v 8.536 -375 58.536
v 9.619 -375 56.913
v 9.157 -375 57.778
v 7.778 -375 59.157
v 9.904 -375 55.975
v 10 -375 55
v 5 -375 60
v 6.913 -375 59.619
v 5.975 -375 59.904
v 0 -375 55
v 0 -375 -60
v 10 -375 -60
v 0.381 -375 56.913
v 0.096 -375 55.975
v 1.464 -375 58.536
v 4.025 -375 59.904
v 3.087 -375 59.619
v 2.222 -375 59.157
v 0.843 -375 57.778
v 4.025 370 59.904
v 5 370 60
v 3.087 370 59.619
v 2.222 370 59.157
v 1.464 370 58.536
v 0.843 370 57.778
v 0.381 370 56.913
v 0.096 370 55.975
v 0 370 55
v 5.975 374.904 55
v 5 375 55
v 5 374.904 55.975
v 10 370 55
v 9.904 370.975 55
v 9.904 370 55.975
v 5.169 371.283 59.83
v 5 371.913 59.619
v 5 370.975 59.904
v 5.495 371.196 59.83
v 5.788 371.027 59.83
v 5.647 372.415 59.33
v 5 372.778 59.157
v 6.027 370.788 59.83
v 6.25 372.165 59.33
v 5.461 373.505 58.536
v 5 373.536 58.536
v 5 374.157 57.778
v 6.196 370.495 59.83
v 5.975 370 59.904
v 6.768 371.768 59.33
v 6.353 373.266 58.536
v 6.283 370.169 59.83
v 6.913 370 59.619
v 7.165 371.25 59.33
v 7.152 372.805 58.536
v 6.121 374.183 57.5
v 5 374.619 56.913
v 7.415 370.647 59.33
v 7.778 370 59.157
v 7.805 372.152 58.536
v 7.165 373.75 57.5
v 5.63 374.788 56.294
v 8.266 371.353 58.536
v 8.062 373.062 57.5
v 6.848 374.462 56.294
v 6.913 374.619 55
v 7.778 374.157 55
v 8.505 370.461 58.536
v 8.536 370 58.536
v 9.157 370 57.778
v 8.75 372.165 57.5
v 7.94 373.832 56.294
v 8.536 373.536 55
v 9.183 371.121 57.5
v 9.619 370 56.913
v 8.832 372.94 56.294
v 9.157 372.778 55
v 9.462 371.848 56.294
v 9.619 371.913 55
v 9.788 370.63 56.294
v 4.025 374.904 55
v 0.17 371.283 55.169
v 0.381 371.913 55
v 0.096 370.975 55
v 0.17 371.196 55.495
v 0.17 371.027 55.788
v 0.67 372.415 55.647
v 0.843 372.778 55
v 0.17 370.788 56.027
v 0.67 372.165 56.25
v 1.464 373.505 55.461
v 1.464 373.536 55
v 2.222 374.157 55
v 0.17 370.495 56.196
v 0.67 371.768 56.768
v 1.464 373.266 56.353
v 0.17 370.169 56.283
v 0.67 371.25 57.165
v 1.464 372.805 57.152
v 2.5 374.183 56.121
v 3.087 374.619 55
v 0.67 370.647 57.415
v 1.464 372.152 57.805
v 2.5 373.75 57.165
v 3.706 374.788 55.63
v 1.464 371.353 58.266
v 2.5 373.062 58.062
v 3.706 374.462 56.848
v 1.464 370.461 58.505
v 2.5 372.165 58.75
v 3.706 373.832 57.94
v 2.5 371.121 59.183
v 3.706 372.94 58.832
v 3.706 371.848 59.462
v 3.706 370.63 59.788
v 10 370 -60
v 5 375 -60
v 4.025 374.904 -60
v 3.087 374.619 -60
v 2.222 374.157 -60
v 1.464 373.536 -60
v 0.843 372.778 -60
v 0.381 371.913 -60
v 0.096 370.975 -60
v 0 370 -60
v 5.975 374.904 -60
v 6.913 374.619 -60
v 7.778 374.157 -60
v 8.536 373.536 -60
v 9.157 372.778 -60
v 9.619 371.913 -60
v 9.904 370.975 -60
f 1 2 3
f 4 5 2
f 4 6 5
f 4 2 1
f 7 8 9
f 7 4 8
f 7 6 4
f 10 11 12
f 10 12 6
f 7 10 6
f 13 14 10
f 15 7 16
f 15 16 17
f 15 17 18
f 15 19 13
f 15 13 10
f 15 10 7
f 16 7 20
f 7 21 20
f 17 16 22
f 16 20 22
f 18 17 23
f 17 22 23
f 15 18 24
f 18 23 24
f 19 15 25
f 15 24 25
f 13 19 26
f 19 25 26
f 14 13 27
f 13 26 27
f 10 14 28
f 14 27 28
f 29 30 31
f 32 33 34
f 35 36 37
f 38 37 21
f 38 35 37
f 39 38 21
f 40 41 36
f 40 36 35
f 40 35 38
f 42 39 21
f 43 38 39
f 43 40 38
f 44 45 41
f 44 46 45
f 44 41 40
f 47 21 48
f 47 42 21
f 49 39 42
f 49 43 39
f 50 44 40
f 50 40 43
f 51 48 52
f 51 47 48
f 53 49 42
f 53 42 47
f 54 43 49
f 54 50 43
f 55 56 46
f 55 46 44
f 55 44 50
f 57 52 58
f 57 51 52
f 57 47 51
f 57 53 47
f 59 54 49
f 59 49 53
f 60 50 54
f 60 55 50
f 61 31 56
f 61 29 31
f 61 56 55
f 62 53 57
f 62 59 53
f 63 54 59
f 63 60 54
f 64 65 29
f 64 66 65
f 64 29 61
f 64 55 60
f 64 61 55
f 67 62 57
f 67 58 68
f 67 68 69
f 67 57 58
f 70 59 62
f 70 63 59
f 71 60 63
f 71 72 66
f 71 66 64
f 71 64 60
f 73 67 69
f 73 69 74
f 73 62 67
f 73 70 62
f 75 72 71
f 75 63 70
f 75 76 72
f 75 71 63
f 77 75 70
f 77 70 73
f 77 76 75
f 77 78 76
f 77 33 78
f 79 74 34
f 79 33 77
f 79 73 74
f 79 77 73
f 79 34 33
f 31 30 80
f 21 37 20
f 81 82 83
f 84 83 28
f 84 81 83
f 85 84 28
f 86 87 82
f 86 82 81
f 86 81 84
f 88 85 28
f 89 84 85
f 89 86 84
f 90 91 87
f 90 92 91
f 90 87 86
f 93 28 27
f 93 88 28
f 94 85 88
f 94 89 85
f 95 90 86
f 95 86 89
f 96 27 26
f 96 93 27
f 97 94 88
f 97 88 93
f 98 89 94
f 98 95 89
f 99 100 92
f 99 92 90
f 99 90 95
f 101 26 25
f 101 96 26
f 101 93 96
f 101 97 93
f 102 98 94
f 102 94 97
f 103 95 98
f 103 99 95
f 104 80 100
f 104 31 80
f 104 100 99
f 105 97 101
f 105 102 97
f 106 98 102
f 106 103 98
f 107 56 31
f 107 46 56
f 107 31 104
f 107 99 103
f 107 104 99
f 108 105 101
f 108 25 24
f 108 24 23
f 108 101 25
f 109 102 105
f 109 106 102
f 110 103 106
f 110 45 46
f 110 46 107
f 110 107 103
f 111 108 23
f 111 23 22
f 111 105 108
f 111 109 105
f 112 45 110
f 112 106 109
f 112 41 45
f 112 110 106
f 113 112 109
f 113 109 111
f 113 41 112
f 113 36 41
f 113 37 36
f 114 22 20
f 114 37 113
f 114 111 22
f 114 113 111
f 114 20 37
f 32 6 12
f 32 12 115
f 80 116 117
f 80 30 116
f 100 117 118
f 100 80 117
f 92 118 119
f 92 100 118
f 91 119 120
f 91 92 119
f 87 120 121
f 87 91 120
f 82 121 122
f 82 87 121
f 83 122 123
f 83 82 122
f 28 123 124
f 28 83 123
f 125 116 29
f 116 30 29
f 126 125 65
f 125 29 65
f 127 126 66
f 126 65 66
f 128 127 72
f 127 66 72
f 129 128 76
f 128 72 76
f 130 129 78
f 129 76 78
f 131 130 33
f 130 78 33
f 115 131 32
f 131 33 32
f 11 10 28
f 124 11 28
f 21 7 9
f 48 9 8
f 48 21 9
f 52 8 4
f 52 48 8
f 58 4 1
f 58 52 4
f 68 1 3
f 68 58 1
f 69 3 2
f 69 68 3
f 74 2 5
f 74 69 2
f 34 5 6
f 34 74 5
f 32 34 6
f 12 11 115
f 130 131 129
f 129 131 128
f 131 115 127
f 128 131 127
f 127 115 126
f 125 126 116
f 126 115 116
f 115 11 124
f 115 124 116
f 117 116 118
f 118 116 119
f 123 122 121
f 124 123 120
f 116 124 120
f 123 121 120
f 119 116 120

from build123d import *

# Parameters (mm, degrees)
F0_W     = 750
F0_H     = 120
F1_DEPTH = 10
F2_R     = 4.99999


# Not quite as in the source:
# - a fillet or chamfer is up to 0.001 mm smaller than in the source, because OpenCascade refuses the exact size


with BuildPart() as f1:
    # F0 (on Right) → F1 (new body)
    with BuildSketch(Plane.YZ):
        Rectangle(F0_W, F0_H)
    extrude(amount=F1_DEPTH)

    # F2 (radius 5 in the source; OpenCascade refuses exactly that, so slightly less here)
    f2_edges = [f1.edges().sort_by_distance(p)[0] for p in [
        (10, 375, 0),
        (5, 375, 60),
        (0, 375, 0),
        (0, 0, 60),
        (10, 0, 60),
    ]]
    fillet(f2_edges, radius=F2_R)


solid = f1.part
